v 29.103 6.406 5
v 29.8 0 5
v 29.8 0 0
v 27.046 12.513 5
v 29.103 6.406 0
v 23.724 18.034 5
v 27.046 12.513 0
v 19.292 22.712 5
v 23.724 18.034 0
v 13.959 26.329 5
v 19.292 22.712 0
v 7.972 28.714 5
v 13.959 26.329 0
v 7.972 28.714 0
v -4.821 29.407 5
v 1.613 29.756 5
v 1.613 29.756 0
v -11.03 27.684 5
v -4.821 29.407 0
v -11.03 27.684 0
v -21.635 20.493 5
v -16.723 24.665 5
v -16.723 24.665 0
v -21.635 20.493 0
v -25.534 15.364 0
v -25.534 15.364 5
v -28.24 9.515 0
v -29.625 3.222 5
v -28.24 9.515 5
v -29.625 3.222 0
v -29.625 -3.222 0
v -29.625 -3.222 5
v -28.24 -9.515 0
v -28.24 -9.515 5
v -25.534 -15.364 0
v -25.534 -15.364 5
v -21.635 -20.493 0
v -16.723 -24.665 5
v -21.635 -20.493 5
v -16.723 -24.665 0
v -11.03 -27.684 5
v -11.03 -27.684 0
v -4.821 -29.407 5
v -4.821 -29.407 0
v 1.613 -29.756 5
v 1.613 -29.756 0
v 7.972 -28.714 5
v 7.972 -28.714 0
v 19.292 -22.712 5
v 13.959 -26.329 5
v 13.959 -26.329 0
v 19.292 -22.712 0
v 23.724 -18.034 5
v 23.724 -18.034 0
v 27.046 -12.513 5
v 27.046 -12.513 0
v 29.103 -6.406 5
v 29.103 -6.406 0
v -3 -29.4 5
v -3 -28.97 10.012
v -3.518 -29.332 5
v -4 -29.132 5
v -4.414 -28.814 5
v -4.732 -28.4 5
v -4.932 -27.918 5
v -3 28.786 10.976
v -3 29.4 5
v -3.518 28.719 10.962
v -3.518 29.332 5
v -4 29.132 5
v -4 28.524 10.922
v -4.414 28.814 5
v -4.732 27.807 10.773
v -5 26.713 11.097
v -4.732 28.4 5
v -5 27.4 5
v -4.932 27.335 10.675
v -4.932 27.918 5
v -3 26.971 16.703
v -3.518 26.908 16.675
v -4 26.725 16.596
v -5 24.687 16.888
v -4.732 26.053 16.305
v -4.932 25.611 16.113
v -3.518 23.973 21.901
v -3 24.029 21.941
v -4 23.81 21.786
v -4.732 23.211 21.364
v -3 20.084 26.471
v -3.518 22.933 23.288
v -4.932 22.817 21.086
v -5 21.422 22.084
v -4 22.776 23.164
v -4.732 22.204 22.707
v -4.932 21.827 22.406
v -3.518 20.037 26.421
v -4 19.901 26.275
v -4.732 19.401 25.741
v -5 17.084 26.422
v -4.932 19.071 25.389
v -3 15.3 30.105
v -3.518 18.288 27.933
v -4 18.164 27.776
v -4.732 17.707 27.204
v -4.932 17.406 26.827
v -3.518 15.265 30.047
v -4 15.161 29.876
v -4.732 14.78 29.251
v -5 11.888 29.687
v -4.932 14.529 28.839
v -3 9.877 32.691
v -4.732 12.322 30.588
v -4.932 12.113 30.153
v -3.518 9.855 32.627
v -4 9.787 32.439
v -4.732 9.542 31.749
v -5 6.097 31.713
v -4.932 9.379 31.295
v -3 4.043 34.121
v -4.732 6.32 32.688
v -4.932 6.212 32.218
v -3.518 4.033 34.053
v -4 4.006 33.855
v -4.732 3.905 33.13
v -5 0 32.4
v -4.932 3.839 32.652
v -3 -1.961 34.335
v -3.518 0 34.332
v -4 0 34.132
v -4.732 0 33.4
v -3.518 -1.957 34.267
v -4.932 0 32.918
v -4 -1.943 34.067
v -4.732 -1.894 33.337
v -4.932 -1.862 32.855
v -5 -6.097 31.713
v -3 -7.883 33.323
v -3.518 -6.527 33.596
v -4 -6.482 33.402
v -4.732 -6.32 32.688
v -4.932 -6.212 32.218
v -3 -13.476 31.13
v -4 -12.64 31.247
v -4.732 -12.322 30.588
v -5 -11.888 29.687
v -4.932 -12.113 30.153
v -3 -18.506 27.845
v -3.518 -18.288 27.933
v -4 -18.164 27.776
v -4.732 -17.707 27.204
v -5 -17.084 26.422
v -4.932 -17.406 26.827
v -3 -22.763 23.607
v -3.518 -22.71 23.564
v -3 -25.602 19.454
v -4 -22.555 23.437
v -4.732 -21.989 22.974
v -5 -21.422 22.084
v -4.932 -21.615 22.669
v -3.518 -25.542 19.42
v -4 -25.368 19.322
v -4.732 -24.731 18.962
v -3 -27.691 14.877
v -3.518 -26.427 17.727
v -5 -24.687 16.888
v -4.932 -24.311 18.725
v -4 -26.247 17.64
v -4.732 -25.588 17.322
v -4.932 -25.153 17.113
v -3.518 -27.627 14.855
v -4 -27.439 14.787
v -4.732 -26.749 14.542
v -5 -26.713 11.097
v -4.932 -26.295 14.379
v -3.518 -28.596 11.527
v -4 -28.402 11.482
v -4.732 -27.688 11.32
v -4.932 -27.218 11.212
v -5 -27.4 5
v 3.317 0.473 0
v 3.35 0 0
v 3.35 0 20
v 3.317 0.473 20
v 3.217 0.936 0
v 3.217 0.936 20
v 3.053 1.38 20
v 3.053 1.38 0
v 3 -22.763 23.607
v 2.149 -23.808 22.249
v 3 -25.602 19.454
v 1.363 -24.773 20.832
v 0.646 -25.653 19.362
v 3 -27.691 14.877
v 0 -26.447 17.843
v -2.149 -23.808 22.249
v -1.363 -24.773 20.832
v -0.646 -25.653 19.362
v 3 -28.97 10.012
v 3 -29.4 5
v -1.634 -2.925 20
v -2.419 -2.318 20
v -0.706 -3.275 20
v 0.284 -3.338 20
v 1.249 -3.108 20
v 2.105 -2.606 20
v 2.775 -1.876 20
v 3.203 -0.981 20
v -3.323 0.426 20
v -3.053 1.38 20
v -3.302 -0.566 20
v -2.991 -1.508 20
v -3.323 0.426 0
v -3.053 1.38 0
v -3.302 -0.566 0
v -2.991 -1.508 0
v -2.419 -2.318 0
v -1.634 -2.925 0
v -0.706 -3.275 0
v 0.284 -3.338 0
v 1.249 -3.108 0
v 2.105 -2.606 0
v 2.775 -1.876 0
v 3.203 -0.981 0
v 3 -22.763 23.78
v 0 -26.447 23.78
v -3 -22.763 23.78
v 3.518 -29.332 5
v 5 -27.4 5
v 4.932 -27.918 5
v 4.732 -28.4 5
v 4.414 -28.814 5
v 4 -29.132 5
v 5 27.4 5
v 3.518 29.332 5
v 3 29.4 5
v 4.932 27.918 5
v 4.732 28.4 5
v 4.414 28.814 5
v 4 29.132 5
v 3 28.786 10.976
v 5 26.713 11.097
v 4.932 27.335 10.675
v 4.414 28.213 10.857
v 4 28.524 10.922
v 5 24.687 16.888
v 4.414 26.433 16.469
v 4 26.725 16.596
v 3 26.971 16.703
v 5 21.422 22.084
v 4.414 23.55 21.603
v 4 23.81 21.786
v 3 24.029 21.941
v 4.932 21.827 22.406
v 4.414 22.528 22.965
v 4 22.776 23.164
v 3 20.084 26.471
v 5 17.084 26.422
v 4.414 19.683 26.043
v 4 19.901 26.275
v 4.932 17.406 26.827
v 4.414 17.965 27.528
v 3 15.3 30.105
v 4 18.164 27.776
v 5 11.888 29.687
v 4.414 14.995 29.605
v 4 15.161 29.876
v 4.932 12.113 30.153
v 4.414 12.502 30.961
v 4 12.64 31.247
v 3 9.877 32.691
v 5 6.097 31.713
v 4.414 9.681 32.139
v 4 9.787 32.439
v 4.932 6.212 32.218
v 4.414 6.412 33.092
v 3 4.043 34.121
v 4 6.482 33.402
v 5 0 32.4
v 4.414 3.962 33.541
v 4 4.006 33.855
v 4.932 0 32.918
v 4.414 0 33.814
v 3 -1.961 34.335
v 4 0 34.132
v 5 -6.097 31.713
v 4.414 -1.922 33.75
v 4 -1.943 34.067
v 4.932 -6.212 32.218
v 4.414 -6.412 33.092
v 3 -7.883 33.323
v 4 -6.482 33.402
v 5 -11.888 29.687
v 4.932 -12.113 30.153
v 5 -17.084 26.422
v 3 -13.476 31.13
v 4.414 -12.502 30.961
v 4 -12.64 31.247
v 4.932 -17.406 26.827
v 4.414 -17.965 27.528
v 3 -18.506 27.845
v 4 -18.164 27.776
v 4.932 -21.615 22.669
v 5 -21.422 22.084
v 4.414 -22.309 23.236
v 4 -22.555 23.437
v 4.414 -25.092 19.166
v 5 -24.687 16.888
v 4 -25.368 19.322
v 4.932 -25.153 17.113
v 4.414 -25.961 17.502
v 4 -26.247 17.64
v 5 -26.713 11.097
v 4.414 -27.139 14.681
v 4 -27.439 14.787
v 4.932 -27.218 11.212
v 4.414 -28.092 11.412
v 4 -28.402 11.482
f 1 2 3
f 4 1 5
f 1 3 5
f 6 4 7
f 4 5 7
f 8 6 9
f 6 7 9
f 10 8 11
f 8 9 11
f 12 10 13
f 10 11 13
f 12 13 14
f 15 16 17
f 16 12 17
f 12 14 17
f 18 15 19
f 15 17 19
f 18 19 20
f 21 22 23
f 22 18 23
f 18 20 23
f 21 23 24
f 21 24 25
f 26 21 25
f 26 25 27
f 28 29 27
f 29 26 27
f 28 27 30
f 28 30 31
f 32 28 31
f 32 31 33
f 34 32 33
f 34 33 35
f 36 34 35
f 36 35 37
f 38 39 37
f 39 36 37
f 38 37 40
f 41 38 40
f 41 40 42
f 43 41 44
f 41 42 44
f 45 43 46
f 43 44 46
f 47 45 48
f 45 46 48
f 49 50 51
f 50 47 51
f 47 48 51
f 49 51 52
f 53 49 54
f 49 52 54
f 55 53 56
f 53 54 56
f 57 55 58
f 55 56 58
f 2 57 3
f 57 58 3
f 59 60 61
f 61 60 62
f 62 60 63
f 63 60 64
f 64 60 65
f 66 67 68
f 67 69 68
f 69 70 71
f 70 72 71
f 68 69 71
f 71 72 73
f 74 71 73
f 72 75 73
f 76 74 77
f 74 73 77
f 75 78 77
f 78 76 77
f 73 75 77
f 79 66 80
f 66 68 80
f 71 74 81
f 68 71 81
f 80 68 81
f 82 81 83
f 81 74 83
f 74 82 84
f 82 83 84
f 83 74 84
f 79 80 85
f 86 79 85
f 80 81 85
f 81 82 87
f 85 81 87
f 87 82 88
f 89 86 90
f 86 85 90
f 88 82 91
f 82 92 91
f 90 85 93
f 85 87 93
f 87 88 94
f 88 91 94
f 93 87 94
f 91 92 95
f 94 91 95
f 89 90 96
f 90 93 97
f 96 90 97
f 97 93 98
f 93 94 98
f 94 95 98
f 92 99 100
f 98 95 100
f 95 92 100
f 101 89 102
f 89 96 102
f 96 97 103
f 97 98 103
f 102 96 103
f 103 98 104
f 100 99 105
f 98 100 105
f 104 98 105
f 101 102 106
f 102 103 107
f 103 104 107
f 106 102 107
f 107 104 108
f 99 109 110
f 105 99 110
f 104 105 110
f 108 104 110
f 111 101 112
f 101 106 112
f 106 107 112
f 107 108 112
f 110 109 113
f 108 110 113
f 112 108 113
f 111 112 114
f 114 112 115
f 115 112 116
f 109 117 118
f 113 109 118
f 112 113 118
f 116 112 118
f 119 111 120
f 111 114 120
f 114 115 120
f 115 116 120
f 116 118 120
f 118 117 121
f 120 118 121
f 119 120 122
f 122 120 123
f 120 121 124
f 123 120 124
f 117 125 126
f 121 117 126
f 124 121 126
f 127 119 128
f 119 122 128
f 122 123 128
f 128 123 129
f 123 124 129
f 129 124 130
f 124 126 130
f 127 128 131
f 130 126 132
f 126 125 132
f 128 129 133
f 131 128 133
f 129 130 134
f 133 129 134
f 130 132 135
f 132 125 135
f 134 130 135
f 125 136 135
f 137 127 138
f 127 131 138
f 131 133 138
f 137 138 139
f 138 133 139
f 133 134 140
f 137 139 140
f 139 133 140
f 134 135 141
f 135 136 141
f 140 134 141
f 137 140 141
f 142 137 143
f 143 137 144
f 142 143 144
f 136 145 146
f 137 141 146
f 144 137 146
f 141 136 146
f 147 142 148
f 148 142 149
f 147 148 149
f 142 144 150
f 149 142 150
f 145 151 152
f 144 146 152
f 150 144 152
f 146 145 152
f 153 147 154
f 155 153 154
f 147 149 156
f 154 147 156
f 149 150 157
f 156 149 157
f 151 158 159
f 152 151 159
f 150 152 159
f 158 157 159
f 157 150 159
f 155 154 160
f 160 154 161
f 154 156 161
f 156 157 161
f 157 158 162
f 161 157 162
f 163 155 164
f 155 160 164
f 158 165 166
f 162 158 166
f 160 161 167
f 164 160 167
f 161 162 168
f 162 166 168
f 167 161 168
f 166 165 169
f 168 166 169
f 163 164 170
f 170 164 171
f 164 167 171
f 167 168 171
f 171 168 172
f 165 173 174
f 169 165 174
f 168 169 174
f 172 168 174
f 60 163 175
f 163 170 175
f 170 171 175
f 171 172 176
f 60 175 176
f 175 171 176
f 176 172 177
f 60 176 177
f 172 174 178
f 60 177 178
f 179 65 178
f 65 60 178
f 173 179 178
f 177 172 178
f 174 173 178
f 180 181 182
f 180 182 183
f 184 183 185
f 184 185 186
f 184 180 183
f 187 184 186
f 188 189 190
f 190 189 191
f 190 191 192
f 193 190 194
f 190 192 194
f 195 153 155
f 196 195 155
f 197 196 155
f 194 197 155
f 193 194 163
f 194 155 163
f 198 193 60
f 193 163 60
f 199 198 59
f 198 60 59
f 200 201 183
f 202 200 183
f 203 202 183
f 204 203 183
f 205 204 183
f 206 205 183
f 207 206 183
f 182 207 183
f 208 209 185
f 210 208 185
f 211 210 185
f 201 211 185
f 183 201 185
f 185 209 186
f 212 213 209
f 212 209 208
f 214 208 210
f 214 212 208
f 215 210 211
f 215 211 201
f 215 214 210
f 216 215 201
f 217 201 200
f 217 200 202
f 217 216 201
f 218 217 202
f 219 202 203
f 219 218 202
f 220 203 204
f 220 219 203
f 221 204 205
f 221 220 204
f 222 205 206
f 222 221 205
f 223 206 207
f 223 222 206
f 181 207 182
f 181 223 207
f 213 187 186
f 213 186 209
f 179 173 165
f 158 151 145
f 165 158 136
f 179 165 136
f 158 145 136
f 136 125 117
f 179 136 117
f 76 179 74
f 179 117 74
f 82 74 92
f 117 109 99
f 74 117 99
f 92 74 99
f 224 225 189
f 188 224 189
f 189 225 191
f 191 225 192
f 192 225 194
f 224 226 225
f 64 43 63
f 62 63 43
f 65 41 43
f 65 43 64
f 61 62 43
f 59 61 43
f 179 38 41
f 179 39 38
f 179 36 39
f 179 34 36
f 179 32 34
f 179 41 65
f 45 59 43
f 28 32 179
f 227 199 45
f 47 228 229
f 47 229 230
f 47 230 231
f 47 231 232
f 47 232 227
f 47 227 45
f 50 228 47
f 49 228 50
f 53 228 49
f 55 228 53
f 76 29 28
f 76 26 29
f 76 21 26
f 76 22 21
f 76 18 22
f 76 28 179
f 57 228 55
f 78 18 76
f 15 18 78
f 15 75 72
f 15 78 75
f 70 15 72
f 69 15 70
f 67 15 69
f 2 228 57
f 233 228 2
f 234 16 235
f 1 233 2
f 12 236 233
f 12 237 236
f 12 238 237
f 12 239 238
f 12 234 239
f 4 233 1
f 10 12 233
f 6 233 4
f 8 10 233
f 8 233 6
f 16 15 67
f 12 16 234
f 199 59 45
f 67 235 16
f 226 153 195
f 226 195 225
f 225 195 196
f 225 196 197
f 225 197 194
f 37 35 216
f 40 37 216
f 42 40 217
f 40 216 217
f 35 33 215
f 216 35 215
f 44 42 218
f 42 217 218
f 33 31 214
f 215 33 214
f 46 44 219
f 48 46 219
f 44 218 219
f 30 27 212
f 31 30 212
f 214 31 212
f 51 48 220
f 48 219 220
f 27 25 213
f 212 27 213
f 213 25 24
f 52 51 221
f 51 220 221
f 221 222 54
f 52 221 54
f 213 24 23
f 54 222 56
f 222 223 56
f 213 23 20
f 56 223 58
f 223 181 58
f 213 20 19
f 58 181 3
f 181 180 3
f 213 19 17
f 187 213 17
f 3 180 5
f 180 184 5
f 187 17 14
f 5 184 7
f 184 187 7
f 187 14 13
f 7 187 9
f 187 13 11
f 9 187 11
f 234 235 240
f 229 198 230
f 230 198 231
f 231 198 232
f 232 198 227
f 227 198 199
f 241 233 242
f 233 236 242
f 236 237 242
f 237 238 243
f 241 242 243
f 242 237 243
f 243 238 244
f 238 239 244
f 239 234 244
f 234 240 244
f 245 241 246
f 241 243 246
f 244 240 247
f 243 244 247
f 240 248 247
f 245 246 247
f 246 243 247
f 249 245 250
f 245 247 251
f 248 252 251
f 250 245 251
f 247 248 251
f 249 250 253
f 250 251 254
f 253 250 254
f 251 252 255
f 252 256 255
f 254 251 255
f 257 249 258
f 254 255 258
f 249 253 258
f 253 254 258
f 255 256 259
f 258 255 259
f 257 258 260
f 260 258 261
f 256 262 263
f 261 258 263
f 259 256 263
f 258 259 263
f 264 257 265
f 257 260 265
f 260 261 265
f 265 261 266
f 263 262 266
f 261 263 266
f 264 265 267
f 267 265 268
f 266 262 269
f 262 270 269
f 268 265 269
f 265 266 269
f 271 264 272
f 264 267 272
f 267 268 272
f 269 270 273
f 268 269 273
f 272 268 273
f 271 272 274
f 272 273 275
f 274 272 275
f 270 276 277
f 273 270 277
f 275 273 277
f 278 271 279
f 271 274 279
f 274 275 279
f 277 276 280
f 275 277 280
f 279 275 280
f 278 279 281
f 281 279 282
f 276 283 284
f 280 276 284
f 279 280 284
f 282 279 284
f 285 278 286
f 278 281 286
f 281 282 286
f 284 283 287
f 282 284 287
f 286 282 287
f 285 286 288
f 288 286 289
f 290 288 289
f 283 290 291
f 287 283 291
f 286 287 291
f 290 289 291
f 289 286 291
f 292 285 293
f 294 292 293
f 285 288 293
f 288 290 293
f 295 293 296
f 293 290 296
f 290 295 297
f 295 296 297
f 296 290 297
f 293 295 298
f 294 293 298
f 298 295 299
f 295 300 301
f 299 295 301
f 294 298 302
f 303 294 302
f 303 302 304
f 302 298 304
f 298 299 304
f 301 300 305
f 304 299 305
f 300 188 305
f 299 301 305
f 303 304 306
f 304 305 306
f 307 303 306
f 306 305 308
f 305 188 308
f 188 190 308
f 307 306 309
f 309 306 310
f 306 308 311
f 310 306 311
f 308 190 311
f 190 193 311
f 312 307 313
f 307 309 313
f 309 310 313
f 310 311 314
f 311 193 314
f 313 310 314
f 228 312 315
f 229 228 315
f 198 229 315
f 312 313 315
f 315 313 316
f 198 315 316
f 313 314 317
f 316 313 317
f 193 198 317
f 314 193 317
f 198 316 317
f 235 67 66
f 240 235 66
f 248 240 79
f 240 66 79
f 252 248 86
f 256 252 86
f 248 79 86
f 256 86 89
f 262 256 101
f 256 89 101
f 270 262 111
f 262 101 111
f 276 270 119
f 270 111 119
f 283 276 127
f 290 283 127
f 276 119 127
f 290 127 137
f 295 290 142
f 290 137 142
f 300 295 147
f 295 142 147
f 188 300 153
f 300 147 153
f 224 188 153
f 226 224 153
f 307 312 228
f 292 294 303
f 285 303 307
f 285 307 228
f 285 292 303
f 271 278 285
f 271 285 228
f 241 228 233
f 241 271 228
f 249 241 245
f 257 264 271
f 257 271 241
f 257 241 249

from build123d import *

# Parameters (mm, degrees)
F0_R          = 29.8
F1_DEPTH      = 5
F3_DEPTH      = 5
F3_DEPTH_BACK = 5
F5_DEPTH      = 20
F6_DEPTH      = 23.78
F7_T2_ANGLE   = 180
F7_T4_ANGLE   = 180


# Not quite as in the source:
# - a fillet or chamfer that OpenCascade refuses, or shapes differently, is made with other operations: its cross-section is extruded or revolved along the edge and cut away or added


with BuildPart() as f1:
    # F0 (on Top) → F1 (new body)
    with BuildSketch(Plane.XY):
        Circle(F0_R)
        Polygon((0, -26.4465436339), (-3, -22.7629262954), (0, -22.7629262954), (3, -22.7629262954), align=None, mode=Mode.SUBTRACT)
    extrude(amount=F1_DEPTH)

    # F2 (on Right) → F3 (join, two sides)
    with BuildSketch(Plane.YZ) as f3_sk:
        with BuildLine():
            Line((-29.4, 5), (29.4, 5))
            ThreePointArc((29.4, 5), (0, 34.4), (-29.4, 5))
        make_face()
    extrude(amount=-F3_DEPTH)
    extrude(f3_sk.sketch, amount=F3_DEPTH_BACK)

    # F4 (on Top) → F5 (cut)
    with BuildSketch(Plane.XY):
        with BuildLine():
            ThreePointArc((-3.0525563058, 1.38), (-0.7058457252, -3.2747949267), (3.35, 0))
            ThreePointArc((3.35, 0), (3.2747949267, 0.7058457252), (3.0525563058, 1.38))
            Line((3.0525563058, 1.38), (-3.0525563058, 1.38))
        make_face()
    extrude(amount=F5_DEPTH, mode=Mode.SUBTRACT)

    # F0 (on Top) → F6 (join)
    with BuildSketch(Plane.XY):
        Polygon((0, -22.7629262954), (-3, -22.7629262954), (0, -26.4465436339), (3, -22.7629262954), align=None)
    extrude(amount=F6_DEPTH)

    # F7: fillet of radius 2 on 2 edges, made by hand

    # F7_s1 → F7_t2 (revolve, cut)
    with BuildSketch(Plane.XY.offset(5)):
        with BuildLine():
            ThreePointArc((-3, 29.4), (-4.4142135624, 28.8142135624), (-5, 27.4))
            Line((-5, 27.4), (-5, 29.4))
            Line((-5, 29.4), (-3, 29.4))
        make_face()
    revolve(axis=Axis((-5, 0, 5), (1, 0, 0)), revolution_arc=F7_T2_ANGLE, mode=Mode.SUBTRACT)

    # F7_s3 → F7_t4 (revolve, cut)
    with BuildSketch(Plane.XY.offset(5)):
        with BuildLine():
            ThreePointArc((5, 27.4), (4.4142135624, 28.8142135624), (3, 29.4))
            Line((3, 29.4), (5, 29.4))
            Line((5, 29.4), (5, 27.4))
        make_face()
    revolve(axis=Axis((5, 0, 5), (1, 0, 0)), revolution_arc=F7_T4_ANGLE, mode=Mode.SUBTRACT)


solid = f1.part
